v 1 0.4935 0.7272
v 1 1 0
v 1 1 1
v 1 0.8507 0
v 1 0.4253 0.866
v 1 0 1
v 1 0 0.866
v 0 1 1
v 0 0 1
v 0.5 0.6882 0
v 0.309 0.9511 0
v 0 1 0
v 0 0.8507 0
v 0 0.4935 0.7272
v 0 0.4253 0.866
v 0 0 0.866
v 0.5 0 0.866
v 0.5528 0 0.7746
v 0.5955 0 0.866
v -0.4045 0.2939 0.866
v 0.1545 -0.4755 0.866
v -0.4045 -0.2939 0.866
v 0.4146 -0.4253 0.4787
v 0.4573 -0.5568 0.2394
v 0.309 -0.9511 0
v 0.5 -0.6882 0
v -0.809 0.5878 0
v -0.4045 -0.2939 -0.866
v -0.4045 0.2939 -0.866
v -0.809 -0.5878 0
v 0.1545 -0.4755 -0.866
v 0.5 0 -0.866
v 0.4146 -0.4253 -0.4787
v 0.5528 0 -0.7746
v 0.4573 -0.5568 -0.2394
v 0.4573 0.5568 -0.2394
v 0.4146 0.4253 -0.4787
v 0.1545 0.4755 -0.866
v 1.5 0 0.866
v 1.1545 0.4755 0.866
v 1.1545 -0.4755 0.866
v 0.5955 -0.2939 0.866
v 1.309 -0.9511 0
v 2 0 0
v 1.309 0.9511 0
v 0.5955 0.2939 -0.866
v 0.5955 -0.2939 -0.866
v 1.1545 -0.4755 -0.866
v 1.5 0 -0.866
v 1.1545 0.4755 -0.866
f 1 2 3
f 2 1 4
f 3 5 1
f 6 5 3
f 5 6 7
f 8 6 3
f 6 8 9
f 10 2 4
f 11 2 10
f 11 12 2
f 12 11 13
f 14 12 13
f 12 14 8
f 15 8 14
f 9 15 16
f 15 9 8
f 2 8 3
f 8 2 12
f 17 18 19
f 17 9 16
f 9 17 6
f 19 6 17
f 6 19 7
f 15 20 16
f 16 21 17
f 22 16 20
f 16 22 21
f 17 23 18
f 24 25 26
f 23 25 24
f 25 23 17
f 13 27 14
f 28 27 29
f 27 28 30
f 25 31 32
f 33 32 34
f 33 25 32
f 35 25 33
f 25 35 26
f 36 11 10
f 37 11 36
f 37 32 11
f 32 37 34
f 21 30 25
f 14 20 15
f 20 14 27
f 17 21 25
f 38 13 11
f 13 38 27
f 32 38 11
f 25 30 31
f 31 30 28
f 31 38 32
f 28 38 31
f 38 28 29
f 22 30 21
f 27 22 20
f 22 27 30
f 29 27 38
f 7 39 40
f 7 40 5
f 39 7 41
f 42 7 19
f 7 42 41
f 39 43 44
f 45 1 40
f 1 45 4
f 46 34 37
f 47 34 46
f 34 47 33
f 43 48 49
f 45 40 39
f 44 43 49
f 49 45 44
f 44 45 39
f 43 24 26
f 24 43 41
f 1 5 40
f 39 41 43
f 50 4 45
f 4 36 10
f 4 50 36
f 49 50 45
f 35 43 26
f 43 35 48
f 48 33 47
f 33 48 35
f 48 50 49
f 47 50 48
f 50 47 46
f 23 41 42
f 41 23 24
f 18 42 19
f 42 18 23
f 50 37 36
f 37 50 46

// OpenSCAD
%cube();
#cube();
*cube();
translate([1, 0, 0]) %sphere();
module q() { #cube(); }
q();
#union() { cube(); #sphere(); }
%translate([1, 0, 0]) #cube();
difference() { cube(); %sphere(); }
module n() { translate([1, 0, 0]) { %cube(); #sphere(); } }
n();
